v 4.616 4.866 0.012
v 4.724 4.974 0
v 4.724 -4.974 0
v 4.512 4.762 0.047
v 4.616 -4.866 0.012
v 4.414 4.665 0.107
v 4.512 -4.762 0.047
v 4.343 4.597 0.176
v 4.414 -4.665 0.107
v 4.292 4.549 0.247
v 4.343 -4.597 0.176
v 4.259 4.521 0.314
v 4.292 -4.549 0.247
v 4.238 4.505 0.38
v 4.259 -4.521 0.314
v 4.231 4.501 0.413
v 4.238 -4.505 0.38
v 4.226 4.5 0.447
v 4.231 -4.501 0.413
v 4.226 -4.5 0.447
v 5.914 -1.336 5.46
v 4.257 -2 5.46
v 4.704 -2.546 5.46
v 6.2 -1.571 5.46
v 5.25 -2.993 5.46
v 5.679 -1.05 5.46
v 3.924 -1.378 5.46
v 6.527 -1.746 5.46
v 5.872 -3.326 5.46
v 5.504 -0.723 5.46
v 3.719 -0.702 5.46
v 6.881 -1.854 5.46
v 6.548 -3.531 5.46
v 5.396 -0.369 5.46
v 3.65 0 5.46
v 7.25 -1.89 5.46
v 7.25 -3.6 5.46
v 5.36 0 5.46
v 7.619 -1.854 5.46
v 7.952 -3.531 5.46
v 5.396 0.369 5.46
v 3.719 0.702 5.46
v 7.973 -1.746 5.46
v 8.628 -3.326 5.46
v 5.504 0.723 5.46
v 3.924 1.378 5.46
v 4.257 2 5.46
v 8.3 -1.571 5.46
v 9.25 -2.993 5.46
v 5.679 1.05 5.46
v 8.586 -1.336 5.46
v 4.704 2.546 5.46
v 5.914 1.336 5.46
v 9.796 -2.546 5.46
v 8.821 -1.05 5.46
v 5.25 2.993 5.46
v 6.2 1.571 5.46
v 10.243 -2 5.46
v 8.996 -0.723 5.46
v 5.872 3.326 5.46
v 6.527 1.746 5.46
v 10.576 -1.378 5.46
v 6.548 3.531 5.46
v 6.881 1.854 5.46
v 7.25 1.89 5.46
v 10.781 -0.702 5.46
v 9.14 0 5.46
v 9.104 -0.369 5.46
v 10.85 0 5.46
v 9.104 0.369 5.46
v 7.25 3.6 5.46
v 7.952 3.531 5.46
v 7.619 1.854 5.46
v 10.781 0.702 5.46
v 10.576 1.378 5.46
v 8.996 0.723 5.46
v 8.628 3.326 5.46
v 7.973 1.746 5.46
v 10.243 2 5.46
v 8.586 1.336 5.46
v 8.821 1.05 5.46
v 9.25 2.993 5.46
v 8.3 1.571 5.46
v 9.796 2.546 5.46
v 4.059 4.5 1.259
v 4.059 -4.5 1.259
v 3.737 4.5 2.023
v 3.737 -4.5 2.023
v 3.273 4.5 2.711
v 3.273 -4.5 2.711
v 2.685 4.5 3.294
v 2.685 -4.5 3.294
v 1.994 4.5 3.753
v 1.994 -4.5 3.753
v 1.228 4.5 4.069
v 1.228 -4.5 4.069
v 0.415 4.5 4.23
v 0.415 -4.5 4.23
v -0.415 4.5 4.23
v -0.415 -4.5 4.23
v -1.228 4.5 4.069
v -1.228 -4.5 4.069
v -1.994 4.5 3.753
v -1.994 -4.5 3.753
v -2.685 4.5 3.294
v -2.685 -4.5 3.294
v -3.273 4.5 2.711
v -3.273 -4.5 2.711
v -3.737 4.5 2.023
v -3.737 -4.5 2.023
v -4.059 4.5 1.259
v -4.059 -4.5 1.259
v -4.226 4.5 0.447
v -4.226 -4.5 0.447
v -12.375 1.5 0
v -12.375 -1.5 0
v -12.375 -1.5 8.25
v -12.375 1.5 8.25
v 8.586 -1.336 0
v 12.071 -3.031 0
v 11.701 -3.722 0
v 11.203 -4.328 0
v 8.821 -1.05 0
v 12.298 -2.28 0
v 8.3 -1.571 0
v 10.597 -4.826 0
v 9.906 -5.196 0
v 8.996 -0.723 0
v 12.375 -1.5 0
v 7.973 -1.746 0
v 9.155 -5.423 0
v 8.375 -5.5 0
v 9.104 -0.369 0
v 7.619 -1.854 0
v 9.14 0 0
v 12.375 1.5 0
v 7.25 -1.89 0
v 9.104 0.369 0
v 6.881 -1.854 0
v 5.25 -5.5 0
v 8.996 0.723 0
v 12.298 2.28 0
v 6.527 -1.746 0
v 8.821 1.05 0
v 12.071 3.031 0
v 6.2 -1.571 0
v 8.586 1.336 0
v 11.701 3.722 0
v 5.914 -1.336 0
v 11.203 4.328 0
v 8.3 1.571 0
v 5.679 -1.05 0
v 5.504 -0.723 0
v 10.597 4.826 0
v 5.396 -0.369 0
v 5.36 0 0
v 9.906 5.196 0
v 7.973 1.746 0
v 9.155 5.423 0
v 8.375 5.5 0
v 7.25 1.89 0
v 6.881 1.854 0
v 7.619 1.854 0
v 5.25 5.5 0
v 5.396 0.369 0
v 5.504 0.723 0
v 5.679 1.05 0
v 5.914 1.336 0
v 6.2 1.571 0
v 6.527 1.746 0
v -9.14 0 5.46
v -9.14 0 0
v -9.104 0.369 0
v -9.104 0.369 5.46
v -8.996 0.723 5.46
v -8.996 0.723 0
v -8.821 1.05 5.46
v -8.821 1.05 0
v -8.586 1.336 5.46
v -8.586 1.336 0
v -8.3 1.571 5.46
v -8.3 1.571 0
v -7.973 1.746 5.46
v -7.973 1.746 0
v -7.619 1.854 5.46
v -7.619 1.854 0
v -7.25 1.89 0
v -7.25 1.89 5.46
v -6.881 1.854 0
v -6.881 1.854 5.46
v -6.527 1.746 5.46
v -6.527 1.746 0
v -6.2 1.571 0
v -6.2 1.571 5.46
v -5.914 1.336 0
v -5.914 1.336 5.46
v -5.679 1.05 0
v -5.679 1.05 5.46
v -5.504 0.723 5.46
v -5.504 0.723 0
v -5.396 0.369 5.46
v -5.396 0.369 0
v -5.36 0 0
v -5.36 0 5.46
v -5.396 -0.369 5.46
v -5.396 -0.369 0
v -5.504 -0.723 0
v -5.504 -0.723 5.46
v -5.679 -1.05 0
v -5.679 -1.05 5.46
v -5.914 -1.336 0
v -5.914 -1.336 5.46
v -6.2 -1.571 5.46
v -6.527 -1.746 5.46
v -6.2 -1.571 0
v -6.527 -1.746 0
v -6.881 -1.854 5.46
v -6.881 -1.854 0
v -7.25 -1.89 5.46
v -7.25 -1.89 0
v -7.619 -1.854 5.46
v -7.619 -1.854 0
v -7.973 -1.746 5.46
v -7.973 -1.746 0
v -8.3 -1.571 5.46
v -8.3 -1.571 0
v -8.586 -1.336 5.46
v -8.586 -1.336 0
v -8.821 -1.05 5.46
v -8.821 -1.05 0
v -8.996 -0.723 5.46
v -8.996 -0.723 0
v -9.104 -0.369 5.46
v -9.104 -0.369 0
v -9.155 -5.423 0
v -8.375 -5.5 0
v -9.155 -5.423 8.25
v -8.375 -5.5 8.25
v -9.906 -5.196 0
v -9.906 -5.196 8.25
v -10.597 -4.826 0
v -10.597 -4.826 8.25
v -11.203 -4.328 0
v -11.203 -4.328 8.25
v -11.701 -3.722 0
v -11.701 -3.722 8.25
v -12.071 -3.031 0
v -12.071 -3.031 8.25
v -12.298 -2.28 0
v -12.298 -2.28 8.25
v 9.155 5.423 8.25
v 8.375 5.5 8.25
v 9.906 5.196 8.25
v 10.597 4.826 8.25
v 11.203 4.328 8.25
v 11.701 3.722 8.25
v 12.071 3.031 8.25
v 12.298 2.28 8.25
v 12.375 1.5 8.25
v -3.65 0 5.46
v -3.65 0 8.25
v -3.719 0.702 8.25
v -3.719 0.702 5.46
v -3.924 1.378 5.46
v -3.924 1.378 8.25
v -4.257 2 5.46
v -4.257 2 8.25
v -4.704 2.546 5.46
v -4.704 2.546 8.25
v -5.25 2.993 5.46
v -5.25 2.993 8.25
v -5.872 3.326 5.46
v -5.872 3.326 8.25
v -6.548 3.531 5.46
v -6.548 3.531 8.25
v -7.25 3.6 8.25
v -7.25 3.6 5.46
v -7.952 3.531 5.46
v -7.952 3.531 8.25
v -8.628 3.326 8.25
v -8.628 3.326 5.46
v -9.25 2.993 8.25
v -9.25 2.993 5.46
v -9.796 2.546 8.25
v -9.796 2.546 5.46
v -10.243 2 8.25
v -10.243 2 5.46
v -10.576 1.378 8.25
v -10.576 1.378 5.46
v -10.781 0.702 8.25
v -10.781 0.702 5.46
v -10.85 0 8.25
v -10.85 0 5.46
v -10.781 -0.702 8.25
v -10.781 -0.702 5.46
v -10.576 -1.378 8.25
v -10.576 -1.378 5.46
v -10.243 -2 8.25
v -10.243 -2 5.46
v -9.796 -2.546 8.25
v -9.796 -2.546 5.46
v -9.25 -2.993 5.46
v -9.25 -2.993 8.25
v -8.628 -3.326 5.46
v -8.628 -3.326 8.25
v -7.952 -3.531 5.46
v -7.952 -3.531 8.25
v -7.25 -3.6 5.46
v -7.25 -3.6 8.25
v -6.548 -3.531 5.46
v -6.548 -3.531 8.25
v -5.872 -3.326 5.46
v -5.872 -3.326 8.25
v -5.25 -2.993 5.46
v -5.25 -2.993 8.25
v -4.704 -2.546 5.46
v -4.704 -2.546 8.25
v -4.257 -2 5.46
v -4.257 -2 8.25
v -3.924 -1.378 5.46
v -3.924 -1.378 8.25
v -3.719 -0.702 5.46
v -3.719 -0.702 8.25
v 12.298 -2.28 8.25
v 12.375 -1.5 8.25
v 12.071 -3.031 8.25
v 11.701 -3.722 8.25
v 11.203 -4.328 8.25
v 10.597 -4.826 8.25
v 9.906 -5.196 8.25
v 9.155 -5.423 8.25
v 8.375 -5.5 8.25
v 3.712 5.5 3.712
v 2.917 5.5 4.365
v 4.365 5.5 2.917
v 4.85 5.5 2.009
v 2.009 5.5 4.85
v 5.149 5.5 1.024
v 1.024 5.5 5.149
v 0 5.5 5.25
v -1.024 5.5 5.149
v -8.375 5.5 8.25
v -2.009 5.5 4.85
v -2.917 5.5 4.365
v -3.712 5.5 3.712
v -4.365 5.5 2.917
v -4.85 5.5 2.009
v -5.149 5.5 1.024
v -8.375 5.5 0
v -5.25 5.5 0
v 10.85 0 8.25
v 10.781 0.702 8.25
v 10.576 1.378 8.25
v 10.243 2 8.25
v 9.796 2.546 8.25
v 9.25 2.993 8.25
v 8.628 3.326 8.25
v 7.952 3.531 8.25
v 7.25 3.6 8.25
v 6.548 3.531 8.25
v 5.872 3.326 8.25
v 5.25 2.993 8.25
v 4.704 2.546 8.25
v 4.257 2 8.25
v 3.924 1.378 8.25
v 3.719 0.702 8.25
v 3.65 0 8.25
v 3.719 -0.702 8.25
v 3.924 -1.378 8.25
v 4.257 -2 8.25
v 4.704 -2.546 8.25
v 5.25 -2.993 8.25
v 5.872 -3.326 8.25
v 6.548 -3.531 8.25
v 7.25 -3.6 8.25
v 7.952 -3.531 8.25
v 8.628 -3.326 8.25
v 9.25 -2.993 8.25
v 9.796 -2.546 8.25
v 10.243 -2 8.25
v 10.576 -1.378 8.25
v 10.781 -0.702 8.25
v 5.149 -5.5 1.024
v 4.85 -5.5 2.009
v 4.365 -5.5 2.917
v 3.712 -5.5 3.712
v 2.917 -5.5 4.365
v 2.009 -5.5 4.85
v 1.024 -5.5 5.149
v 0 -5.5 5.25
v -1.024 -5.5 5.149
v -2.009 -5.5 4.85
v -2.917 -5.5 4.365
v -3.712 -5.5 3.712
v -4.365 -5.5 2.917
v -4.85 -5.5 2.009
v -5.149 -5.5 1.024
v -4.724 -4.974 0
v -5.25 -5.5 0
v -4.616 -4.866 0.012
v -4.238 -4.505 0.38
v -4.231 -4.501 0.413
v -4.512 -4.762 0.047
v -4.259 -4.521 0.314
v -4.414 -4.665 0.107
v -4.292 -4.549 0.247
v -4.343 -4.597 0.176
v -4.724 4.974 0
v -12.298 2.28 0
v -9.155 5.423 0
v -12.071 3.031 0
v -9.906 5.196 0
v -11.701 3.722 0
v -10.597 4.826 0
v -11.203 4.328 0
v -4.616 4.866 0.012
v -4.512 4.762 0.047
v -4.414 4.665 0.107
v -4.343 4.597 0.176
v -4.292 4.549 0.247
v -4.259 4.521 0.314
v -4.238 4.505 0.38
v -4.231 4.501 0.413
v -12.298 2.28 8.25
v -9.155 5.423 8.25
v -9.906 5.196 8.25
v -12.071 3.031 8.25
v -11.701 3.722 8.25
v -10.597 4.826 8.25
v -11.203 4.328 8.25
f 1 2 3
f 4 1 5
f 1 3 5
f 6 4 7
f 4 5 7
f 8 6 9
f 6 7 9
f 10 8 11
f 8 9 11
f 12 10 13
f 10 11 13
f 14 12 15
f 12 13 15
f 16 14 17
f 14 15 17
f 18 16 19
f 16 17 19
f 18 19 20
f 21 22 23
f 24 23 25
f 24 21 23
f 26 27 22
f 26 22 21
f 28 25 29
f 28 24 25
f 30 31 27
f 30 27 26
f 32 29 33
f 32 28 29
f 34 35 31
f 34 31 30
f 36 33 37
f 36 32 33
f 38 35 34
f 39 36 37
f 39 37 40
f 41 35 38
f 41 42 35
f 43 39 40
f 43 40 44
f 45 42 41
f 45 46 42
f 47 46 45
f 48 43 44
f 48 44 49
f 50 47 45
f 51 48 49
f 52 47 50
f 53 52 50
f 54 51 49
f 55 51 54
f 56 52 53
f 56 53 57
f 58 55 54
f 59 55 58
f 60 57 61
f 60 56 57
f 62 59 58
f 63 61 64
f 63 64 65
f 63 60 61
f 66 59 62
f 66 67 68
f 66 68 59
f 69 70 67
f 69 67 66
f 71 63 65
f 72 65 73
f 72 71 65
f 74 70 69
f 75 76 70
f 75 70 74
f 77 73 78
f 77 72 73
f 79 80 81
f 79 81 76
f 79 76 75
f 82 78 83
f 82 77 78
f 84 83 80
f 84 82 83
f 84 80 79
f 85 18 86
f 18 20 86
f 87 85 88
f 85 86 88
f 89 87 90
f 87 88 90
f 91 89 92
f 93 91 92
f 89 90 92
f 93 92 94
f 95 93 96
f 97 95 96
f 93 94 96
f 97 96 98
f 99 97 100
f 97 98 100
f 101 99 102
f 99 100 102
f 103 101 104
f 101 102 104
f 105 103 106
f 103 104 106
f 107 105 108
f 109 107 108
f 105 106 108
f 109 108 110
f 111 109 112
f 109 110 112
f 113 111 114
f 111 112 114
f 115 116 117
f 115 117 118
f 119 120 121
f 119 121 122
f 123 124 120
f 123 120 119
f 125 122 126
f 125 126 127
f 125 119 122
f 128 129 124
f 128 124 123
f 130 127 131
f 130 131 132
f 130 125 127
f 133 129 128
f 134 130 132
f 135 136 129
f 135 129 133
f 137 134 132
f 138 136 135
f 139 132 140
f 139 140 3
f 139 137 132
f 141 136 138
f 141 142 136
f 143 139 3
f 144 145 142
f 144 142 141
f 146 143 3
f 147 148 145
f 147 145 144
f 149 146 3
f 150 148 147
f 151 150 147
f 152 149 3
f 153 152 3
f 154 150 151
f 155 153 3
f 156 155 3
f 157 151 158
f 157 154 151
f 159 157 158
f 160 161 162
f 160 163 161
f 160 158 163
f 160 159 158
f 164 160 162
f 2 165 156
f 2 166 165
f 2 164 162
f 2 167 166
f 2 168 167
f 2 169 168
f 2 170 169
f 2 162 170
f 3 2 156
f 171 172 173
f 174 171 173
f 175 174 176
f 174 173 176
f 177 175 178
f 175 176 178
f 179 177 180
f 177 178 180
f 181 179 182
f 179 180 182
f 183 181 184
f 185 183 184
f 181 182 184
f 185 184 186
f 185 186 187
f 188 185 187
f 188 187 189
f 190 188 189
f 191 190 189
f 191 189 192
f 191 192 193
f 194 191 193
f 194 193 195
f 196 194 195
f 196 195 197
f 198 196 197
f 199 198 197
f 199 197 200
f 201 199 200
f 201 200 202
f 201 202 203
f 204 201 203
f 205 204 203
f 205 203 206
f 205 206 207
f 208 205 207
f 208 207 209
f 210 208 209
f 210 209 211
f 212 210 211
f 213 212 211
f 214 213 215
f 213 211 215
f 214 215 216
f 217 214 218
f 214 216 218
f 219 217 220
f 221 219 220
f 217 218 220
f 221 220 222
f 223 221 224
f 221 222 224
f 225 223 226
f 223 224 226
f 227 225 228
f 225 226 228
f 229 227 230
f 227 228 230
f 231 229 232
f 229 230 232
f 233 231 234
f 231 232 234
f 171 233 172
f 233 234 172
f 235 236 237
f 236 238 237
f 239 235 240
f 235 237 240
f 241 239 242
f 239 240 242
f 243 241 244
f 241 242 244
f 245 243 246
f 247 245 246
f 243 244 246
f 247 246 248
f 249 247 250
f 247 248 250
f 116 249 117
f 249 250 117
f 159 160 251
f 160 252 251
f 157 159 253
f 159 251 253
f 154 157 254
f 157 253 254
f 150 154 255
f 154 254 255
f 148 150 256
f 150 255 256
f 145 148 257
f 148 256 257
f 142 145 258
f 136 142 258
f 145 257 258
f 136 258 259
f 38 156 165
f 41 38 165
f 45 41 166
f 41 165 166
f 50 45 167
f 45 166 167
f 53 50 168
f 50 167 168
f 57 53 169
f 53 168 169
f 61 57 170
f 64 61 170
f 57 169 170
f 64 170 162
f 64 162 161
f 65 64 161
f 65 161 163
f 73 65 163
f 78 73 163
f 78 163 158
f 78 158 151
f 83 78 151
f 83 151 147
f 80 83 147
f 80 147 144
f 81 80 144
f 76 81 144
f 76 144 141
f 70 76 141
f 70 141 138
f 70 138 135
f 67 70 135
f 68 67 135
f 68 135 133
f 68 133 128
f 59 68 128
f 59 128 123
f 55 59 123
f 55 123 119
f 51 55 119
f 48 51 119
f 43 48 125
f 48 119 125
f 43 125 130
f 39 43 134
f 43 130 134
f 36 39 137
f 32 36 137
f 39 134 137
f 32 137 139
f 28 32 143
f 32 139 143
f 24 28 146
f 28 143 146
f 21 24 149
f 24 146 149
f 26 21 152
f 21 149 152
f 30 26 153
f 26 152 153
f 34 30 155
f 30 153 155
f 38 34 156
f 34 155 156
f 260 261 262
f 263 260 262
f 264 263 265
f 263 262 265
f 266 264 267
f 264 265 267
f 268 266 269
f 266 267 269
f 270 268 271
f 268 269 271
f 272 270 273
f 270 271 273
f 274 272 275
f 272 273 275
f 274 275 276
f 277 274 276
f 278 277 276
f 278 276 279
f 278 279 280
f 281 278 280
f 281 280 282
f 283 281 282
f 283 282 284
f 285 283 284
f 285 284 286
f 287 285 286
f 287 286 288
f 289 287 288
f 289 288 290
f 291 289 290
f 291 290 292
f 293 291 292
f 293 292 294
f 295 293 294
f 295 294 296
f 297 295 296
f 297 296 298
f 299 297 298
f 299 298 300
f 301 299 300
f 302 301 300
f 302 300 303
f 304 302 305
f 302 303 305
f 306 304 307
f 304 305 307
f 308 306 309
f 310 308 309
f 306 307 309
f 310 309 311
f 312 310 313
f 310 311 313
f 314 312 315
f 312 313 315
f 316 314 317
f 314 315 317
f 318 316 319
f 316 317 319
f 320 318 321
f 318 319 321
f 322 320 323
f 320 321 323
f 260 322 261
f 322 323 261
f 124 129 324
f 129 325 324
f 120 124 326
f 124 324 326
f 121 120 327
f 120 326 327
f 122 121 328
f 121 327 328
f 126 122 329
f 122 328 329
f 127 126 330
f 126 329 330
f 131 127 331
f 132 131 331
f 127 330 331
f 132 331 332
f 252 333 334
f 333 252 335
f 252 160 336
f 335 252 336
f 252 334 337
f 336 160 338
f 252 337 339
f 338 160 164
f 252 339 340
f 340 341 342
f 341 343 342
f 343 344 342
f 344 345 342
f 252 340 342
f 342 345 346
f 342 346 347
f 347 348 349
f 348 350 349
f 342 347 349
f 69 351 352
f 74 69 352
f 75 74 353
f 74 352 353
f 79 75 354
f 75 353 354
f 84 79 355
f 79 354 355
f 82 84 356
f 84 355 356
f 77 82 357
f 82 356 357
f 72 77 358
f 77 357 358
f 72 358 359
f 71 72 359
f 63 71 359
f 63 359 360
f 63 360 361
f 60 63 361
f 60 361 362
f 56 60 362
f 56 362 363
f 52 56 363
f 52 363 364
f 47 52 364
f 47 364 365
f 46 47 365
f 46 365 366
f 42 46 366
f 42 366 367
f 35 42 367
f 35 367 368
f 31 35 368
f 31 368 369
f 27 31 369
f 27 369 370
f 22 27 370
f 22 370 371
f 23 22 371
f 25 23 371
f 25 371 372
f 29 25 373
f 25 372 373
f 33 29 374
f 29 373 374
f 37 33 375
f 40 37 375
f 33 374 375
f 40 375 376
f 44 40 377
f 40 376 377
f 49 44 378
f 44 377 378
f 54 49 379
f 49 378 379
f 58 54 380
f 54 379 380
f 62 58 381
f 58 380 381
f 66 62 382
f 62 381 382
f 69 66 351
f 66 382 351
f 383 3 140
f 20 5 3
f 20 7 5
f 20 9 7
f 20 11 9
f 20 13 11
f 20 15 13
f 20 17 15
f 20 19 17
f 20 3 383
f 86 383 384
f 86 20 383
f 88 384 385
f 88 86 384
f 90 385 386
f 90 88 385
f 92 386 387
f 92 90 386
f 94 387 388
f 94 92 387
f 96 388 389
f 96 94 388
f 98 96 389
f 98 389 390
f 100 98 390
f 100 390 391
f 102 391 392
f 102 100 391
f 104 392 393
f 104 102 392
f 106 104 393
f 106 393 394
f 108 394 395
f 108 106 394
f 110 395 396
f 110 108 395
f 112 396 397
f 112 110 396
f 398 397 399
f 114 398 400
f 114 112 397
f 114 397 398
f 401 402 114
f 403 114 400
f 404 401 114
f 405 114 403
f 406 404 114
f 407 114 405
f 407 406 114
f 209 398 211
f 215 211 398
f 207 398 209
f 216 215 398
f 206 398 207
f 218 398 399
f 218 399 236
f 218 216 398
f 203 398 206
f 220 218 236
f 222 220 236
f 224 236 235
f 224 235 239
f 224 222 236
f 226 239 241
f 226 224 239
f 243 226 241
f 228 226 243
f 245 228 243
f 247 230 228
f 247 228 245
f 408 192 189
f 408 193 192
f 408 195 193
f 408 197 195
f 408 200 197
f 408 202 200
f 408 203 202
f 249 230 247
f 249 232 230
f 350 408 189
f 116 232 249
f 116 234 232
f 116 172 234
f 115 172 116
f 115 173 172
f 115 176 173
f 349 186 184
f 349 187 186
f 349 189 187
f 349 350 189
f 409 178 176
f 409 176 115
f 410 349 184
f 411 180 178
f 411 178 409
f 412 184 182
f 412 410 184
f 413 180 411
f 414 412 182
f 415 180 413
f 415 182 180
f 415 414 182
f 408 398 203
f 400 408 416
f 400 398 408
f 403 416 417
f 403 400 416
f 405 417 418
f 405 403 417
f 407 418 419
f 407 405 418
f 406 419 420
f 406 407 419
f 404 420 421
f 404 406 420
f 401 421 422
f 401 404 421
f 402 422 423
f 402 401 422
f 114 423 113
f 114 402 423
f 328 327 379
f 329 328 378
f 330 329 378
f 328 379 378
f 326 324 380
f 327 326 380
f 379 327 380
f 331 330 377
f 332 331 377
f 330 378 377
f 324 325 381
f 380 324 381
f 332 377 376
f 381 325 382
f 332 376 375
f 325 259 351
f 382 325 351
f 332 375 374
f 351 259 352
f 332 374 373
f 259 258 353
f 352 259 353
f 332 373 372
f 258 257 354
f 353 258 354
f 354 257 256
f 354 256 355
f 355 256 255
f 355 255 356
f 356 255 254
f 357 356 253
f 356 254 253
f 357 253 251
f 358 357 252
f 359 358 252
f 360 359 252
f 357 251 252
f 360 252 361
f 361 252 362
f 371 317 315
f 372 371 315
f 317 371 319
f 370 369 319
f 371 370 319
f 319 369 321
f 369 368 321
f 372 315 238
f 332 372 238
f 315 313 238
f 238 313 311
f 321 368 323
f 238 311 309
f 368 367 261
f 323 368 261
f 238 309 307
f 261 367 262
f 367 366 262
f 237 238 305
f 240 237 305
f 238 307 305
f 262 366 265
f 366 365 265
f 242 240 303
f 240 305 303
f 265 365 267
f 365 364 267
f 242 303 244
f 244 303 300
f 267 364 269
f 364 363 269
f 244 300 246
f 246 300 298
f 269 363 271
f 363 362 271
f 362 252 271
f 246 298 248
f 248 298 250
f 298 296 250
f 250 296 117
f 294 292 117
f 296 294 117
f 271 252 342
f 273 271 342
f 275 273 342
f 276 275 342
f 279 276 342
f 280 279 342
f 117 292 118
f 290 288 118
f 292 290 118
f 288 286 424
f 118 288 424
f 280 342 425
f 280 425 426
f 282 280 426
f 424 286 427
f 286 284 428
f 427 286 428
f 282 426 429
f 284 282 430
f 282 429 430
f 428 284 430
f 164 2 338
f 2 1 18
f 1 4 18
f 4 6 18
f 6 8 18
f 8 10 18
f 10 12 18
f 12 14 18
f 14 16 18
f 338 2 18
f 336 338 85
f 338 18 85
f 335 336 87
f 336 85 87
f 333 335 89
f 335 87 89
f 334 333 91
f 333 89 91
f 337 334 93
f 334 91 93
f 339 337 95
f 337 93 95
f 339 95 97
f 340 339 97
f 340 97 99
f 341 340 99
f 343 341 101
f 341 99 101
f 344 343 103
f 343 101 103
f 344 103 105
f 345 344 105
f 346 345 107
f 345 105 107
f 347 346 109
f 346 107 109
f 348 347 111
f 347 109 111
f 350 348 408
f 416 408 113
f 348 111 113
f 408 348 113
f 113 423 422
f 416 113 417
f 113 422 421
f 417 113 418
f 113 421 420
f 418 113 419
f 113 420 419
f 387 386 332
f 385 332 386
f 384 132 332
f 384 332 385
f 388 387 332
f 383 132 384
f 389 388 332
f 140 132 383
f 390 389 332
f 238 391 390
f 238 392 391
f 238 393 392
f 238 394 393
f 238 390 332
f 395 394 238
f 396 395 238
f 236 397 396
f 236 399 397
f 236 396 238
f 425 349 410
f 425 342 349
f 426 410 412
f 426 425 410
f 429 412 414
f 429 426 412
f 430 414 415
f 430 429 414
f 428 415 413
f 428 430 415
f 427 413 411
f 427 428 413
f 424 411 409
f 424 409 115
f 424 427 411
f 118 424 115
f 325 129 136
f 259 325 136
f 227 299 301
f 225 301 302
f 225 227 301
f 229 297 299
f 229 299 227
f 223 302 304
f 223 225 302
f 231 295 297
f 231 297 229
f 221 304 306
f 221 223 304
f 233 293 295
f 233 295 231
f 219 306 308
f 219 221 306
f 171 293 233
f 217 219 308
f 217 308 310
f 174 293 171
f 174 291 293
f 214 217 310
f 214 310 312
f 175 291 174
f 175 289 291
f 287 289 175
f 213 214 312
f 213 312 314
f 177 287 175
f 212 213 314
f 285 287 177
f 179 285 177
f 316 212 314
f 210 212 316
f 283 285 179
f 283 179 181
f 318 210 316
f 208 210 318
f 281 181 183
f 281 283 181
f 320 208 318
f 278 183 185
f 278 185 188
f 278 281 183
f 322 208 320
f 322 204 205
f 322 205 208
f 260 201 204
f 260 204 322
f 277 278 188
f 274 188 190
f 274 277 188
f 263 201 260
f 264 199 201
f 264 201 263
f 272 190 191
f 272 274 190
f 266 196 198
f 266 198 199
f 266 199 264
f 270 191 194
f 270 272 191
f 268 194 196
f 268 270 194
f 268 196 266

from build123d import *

# Parameters (mm, degrees)
CROQUIS1_W                                           = 24.75
CROQUIS1_H                                           = 11
SALIENTE_EXTRUIR1_DEPTH                              = 8.25
REFRENTADO_PARA_TORNILLO_CON_CABEZA_HEXA_D           = 3.78
REFRENTADO_PARA_TORNILLO_CON_CABEZA_HEXA_DEPTH       = 8.25
REFRENTADO_PARA_TORNILLO_CON_CABEZA_HEXA_CBORE_D     = 7.2
REFRENTADO_PARA_TORNILLO_CON_CABEZA_HEXA_CBORE_DEPTH = 2.79
DI_METRO_DE_TALADRO_8_5_8_5_1_D                      = 8.5
DI_METRO_DE_TALADRO_8_5_8_5_1_DEPTH                  = 11
CHAFL_N1_SIZE                                        = 1
REDONDEO1_R                                          = 0.5
REDONDEO2_R                                          = 4


with BuildPart() as part:
    # Croquis1 → Saliente-Extruir1 (new body)
    with BuildSketch(Plane(origin=(0, 0, 0), x_dir=(-1, 0, 0), z_dir=(0, 0, -1))):
        Rectangle(CROQUIS1_W, CROQUIS1_H)
    extrude(amount=-SALIENTE_EXTRUIR1_DEPTH)

    # Refrentado para tornillo con cabeza hexagonal de M3.51
    with Locations(Plane.XY.offset(8.25)):
        with Locations((-7.25, 0), (7.25, 0)):
            CounterBoreHole(REFRENTADO_PARA_TORNILLO_CON_CABEZA_HEXA_D / 2, REFRENTADO_PARA_TORNILLO_CON_CABEZA_HEXA_CBORE_D / 2, REFRENTADO_PARA_TORNILLO_CON_CABEZA_HEXA_CBORE_DEPTH, depth=REFRENTADO_PARA_TORNILLO_CON_CABEZA_HEXA_DEPTH)

    # Diámetro de taladro Ø8.5 (8.5)1
    with Locations(Plane(origin=(0, 5.5, 0), x_dir=(1, 0, 0), z_dir=(0, 1, 0))):
        with Locations((0, 0)):
            Hole(DI_METRO_DE_TALADRO_8_5_8_5_1_D / 2, depth=DI_METRO_DE_TALADRO_8_5_8_5_1_DEPTH)

    # Chaflán1
    chafl_n1_edges = [part.edges().sort_by_distance(p)[0] for p in [
        (0, 5.5, 4.25),
        (0, -5.5, 4.25),
    ]]
    chamfer(chafl_n1_edges, length=CHAFL_N1_SIZE)

    # Redondeo1
    redondeo1_edges = [part.edges().sort_by_distance(p)[0] for p in [
        (4.25, 0, 0),
        (-4.25, 0, 0),
    ]]
    fillet(redondeo1_edges, radius=REDONDEO1_R)

    # Redondeo2
    redondeo2_edges = [part.edges().sort_by_distance(p)[0] for p in [
        (-12.375, 5.5, 4.125),
        (-12.375, -5.5, 4.125),
        (12.375, -5.5, 4.125),
        (12.375, 5.5, 4.125),
    ]]
    fillet(redondeo2_edges, radius=REDONDEO2_R)


solid = part.part
